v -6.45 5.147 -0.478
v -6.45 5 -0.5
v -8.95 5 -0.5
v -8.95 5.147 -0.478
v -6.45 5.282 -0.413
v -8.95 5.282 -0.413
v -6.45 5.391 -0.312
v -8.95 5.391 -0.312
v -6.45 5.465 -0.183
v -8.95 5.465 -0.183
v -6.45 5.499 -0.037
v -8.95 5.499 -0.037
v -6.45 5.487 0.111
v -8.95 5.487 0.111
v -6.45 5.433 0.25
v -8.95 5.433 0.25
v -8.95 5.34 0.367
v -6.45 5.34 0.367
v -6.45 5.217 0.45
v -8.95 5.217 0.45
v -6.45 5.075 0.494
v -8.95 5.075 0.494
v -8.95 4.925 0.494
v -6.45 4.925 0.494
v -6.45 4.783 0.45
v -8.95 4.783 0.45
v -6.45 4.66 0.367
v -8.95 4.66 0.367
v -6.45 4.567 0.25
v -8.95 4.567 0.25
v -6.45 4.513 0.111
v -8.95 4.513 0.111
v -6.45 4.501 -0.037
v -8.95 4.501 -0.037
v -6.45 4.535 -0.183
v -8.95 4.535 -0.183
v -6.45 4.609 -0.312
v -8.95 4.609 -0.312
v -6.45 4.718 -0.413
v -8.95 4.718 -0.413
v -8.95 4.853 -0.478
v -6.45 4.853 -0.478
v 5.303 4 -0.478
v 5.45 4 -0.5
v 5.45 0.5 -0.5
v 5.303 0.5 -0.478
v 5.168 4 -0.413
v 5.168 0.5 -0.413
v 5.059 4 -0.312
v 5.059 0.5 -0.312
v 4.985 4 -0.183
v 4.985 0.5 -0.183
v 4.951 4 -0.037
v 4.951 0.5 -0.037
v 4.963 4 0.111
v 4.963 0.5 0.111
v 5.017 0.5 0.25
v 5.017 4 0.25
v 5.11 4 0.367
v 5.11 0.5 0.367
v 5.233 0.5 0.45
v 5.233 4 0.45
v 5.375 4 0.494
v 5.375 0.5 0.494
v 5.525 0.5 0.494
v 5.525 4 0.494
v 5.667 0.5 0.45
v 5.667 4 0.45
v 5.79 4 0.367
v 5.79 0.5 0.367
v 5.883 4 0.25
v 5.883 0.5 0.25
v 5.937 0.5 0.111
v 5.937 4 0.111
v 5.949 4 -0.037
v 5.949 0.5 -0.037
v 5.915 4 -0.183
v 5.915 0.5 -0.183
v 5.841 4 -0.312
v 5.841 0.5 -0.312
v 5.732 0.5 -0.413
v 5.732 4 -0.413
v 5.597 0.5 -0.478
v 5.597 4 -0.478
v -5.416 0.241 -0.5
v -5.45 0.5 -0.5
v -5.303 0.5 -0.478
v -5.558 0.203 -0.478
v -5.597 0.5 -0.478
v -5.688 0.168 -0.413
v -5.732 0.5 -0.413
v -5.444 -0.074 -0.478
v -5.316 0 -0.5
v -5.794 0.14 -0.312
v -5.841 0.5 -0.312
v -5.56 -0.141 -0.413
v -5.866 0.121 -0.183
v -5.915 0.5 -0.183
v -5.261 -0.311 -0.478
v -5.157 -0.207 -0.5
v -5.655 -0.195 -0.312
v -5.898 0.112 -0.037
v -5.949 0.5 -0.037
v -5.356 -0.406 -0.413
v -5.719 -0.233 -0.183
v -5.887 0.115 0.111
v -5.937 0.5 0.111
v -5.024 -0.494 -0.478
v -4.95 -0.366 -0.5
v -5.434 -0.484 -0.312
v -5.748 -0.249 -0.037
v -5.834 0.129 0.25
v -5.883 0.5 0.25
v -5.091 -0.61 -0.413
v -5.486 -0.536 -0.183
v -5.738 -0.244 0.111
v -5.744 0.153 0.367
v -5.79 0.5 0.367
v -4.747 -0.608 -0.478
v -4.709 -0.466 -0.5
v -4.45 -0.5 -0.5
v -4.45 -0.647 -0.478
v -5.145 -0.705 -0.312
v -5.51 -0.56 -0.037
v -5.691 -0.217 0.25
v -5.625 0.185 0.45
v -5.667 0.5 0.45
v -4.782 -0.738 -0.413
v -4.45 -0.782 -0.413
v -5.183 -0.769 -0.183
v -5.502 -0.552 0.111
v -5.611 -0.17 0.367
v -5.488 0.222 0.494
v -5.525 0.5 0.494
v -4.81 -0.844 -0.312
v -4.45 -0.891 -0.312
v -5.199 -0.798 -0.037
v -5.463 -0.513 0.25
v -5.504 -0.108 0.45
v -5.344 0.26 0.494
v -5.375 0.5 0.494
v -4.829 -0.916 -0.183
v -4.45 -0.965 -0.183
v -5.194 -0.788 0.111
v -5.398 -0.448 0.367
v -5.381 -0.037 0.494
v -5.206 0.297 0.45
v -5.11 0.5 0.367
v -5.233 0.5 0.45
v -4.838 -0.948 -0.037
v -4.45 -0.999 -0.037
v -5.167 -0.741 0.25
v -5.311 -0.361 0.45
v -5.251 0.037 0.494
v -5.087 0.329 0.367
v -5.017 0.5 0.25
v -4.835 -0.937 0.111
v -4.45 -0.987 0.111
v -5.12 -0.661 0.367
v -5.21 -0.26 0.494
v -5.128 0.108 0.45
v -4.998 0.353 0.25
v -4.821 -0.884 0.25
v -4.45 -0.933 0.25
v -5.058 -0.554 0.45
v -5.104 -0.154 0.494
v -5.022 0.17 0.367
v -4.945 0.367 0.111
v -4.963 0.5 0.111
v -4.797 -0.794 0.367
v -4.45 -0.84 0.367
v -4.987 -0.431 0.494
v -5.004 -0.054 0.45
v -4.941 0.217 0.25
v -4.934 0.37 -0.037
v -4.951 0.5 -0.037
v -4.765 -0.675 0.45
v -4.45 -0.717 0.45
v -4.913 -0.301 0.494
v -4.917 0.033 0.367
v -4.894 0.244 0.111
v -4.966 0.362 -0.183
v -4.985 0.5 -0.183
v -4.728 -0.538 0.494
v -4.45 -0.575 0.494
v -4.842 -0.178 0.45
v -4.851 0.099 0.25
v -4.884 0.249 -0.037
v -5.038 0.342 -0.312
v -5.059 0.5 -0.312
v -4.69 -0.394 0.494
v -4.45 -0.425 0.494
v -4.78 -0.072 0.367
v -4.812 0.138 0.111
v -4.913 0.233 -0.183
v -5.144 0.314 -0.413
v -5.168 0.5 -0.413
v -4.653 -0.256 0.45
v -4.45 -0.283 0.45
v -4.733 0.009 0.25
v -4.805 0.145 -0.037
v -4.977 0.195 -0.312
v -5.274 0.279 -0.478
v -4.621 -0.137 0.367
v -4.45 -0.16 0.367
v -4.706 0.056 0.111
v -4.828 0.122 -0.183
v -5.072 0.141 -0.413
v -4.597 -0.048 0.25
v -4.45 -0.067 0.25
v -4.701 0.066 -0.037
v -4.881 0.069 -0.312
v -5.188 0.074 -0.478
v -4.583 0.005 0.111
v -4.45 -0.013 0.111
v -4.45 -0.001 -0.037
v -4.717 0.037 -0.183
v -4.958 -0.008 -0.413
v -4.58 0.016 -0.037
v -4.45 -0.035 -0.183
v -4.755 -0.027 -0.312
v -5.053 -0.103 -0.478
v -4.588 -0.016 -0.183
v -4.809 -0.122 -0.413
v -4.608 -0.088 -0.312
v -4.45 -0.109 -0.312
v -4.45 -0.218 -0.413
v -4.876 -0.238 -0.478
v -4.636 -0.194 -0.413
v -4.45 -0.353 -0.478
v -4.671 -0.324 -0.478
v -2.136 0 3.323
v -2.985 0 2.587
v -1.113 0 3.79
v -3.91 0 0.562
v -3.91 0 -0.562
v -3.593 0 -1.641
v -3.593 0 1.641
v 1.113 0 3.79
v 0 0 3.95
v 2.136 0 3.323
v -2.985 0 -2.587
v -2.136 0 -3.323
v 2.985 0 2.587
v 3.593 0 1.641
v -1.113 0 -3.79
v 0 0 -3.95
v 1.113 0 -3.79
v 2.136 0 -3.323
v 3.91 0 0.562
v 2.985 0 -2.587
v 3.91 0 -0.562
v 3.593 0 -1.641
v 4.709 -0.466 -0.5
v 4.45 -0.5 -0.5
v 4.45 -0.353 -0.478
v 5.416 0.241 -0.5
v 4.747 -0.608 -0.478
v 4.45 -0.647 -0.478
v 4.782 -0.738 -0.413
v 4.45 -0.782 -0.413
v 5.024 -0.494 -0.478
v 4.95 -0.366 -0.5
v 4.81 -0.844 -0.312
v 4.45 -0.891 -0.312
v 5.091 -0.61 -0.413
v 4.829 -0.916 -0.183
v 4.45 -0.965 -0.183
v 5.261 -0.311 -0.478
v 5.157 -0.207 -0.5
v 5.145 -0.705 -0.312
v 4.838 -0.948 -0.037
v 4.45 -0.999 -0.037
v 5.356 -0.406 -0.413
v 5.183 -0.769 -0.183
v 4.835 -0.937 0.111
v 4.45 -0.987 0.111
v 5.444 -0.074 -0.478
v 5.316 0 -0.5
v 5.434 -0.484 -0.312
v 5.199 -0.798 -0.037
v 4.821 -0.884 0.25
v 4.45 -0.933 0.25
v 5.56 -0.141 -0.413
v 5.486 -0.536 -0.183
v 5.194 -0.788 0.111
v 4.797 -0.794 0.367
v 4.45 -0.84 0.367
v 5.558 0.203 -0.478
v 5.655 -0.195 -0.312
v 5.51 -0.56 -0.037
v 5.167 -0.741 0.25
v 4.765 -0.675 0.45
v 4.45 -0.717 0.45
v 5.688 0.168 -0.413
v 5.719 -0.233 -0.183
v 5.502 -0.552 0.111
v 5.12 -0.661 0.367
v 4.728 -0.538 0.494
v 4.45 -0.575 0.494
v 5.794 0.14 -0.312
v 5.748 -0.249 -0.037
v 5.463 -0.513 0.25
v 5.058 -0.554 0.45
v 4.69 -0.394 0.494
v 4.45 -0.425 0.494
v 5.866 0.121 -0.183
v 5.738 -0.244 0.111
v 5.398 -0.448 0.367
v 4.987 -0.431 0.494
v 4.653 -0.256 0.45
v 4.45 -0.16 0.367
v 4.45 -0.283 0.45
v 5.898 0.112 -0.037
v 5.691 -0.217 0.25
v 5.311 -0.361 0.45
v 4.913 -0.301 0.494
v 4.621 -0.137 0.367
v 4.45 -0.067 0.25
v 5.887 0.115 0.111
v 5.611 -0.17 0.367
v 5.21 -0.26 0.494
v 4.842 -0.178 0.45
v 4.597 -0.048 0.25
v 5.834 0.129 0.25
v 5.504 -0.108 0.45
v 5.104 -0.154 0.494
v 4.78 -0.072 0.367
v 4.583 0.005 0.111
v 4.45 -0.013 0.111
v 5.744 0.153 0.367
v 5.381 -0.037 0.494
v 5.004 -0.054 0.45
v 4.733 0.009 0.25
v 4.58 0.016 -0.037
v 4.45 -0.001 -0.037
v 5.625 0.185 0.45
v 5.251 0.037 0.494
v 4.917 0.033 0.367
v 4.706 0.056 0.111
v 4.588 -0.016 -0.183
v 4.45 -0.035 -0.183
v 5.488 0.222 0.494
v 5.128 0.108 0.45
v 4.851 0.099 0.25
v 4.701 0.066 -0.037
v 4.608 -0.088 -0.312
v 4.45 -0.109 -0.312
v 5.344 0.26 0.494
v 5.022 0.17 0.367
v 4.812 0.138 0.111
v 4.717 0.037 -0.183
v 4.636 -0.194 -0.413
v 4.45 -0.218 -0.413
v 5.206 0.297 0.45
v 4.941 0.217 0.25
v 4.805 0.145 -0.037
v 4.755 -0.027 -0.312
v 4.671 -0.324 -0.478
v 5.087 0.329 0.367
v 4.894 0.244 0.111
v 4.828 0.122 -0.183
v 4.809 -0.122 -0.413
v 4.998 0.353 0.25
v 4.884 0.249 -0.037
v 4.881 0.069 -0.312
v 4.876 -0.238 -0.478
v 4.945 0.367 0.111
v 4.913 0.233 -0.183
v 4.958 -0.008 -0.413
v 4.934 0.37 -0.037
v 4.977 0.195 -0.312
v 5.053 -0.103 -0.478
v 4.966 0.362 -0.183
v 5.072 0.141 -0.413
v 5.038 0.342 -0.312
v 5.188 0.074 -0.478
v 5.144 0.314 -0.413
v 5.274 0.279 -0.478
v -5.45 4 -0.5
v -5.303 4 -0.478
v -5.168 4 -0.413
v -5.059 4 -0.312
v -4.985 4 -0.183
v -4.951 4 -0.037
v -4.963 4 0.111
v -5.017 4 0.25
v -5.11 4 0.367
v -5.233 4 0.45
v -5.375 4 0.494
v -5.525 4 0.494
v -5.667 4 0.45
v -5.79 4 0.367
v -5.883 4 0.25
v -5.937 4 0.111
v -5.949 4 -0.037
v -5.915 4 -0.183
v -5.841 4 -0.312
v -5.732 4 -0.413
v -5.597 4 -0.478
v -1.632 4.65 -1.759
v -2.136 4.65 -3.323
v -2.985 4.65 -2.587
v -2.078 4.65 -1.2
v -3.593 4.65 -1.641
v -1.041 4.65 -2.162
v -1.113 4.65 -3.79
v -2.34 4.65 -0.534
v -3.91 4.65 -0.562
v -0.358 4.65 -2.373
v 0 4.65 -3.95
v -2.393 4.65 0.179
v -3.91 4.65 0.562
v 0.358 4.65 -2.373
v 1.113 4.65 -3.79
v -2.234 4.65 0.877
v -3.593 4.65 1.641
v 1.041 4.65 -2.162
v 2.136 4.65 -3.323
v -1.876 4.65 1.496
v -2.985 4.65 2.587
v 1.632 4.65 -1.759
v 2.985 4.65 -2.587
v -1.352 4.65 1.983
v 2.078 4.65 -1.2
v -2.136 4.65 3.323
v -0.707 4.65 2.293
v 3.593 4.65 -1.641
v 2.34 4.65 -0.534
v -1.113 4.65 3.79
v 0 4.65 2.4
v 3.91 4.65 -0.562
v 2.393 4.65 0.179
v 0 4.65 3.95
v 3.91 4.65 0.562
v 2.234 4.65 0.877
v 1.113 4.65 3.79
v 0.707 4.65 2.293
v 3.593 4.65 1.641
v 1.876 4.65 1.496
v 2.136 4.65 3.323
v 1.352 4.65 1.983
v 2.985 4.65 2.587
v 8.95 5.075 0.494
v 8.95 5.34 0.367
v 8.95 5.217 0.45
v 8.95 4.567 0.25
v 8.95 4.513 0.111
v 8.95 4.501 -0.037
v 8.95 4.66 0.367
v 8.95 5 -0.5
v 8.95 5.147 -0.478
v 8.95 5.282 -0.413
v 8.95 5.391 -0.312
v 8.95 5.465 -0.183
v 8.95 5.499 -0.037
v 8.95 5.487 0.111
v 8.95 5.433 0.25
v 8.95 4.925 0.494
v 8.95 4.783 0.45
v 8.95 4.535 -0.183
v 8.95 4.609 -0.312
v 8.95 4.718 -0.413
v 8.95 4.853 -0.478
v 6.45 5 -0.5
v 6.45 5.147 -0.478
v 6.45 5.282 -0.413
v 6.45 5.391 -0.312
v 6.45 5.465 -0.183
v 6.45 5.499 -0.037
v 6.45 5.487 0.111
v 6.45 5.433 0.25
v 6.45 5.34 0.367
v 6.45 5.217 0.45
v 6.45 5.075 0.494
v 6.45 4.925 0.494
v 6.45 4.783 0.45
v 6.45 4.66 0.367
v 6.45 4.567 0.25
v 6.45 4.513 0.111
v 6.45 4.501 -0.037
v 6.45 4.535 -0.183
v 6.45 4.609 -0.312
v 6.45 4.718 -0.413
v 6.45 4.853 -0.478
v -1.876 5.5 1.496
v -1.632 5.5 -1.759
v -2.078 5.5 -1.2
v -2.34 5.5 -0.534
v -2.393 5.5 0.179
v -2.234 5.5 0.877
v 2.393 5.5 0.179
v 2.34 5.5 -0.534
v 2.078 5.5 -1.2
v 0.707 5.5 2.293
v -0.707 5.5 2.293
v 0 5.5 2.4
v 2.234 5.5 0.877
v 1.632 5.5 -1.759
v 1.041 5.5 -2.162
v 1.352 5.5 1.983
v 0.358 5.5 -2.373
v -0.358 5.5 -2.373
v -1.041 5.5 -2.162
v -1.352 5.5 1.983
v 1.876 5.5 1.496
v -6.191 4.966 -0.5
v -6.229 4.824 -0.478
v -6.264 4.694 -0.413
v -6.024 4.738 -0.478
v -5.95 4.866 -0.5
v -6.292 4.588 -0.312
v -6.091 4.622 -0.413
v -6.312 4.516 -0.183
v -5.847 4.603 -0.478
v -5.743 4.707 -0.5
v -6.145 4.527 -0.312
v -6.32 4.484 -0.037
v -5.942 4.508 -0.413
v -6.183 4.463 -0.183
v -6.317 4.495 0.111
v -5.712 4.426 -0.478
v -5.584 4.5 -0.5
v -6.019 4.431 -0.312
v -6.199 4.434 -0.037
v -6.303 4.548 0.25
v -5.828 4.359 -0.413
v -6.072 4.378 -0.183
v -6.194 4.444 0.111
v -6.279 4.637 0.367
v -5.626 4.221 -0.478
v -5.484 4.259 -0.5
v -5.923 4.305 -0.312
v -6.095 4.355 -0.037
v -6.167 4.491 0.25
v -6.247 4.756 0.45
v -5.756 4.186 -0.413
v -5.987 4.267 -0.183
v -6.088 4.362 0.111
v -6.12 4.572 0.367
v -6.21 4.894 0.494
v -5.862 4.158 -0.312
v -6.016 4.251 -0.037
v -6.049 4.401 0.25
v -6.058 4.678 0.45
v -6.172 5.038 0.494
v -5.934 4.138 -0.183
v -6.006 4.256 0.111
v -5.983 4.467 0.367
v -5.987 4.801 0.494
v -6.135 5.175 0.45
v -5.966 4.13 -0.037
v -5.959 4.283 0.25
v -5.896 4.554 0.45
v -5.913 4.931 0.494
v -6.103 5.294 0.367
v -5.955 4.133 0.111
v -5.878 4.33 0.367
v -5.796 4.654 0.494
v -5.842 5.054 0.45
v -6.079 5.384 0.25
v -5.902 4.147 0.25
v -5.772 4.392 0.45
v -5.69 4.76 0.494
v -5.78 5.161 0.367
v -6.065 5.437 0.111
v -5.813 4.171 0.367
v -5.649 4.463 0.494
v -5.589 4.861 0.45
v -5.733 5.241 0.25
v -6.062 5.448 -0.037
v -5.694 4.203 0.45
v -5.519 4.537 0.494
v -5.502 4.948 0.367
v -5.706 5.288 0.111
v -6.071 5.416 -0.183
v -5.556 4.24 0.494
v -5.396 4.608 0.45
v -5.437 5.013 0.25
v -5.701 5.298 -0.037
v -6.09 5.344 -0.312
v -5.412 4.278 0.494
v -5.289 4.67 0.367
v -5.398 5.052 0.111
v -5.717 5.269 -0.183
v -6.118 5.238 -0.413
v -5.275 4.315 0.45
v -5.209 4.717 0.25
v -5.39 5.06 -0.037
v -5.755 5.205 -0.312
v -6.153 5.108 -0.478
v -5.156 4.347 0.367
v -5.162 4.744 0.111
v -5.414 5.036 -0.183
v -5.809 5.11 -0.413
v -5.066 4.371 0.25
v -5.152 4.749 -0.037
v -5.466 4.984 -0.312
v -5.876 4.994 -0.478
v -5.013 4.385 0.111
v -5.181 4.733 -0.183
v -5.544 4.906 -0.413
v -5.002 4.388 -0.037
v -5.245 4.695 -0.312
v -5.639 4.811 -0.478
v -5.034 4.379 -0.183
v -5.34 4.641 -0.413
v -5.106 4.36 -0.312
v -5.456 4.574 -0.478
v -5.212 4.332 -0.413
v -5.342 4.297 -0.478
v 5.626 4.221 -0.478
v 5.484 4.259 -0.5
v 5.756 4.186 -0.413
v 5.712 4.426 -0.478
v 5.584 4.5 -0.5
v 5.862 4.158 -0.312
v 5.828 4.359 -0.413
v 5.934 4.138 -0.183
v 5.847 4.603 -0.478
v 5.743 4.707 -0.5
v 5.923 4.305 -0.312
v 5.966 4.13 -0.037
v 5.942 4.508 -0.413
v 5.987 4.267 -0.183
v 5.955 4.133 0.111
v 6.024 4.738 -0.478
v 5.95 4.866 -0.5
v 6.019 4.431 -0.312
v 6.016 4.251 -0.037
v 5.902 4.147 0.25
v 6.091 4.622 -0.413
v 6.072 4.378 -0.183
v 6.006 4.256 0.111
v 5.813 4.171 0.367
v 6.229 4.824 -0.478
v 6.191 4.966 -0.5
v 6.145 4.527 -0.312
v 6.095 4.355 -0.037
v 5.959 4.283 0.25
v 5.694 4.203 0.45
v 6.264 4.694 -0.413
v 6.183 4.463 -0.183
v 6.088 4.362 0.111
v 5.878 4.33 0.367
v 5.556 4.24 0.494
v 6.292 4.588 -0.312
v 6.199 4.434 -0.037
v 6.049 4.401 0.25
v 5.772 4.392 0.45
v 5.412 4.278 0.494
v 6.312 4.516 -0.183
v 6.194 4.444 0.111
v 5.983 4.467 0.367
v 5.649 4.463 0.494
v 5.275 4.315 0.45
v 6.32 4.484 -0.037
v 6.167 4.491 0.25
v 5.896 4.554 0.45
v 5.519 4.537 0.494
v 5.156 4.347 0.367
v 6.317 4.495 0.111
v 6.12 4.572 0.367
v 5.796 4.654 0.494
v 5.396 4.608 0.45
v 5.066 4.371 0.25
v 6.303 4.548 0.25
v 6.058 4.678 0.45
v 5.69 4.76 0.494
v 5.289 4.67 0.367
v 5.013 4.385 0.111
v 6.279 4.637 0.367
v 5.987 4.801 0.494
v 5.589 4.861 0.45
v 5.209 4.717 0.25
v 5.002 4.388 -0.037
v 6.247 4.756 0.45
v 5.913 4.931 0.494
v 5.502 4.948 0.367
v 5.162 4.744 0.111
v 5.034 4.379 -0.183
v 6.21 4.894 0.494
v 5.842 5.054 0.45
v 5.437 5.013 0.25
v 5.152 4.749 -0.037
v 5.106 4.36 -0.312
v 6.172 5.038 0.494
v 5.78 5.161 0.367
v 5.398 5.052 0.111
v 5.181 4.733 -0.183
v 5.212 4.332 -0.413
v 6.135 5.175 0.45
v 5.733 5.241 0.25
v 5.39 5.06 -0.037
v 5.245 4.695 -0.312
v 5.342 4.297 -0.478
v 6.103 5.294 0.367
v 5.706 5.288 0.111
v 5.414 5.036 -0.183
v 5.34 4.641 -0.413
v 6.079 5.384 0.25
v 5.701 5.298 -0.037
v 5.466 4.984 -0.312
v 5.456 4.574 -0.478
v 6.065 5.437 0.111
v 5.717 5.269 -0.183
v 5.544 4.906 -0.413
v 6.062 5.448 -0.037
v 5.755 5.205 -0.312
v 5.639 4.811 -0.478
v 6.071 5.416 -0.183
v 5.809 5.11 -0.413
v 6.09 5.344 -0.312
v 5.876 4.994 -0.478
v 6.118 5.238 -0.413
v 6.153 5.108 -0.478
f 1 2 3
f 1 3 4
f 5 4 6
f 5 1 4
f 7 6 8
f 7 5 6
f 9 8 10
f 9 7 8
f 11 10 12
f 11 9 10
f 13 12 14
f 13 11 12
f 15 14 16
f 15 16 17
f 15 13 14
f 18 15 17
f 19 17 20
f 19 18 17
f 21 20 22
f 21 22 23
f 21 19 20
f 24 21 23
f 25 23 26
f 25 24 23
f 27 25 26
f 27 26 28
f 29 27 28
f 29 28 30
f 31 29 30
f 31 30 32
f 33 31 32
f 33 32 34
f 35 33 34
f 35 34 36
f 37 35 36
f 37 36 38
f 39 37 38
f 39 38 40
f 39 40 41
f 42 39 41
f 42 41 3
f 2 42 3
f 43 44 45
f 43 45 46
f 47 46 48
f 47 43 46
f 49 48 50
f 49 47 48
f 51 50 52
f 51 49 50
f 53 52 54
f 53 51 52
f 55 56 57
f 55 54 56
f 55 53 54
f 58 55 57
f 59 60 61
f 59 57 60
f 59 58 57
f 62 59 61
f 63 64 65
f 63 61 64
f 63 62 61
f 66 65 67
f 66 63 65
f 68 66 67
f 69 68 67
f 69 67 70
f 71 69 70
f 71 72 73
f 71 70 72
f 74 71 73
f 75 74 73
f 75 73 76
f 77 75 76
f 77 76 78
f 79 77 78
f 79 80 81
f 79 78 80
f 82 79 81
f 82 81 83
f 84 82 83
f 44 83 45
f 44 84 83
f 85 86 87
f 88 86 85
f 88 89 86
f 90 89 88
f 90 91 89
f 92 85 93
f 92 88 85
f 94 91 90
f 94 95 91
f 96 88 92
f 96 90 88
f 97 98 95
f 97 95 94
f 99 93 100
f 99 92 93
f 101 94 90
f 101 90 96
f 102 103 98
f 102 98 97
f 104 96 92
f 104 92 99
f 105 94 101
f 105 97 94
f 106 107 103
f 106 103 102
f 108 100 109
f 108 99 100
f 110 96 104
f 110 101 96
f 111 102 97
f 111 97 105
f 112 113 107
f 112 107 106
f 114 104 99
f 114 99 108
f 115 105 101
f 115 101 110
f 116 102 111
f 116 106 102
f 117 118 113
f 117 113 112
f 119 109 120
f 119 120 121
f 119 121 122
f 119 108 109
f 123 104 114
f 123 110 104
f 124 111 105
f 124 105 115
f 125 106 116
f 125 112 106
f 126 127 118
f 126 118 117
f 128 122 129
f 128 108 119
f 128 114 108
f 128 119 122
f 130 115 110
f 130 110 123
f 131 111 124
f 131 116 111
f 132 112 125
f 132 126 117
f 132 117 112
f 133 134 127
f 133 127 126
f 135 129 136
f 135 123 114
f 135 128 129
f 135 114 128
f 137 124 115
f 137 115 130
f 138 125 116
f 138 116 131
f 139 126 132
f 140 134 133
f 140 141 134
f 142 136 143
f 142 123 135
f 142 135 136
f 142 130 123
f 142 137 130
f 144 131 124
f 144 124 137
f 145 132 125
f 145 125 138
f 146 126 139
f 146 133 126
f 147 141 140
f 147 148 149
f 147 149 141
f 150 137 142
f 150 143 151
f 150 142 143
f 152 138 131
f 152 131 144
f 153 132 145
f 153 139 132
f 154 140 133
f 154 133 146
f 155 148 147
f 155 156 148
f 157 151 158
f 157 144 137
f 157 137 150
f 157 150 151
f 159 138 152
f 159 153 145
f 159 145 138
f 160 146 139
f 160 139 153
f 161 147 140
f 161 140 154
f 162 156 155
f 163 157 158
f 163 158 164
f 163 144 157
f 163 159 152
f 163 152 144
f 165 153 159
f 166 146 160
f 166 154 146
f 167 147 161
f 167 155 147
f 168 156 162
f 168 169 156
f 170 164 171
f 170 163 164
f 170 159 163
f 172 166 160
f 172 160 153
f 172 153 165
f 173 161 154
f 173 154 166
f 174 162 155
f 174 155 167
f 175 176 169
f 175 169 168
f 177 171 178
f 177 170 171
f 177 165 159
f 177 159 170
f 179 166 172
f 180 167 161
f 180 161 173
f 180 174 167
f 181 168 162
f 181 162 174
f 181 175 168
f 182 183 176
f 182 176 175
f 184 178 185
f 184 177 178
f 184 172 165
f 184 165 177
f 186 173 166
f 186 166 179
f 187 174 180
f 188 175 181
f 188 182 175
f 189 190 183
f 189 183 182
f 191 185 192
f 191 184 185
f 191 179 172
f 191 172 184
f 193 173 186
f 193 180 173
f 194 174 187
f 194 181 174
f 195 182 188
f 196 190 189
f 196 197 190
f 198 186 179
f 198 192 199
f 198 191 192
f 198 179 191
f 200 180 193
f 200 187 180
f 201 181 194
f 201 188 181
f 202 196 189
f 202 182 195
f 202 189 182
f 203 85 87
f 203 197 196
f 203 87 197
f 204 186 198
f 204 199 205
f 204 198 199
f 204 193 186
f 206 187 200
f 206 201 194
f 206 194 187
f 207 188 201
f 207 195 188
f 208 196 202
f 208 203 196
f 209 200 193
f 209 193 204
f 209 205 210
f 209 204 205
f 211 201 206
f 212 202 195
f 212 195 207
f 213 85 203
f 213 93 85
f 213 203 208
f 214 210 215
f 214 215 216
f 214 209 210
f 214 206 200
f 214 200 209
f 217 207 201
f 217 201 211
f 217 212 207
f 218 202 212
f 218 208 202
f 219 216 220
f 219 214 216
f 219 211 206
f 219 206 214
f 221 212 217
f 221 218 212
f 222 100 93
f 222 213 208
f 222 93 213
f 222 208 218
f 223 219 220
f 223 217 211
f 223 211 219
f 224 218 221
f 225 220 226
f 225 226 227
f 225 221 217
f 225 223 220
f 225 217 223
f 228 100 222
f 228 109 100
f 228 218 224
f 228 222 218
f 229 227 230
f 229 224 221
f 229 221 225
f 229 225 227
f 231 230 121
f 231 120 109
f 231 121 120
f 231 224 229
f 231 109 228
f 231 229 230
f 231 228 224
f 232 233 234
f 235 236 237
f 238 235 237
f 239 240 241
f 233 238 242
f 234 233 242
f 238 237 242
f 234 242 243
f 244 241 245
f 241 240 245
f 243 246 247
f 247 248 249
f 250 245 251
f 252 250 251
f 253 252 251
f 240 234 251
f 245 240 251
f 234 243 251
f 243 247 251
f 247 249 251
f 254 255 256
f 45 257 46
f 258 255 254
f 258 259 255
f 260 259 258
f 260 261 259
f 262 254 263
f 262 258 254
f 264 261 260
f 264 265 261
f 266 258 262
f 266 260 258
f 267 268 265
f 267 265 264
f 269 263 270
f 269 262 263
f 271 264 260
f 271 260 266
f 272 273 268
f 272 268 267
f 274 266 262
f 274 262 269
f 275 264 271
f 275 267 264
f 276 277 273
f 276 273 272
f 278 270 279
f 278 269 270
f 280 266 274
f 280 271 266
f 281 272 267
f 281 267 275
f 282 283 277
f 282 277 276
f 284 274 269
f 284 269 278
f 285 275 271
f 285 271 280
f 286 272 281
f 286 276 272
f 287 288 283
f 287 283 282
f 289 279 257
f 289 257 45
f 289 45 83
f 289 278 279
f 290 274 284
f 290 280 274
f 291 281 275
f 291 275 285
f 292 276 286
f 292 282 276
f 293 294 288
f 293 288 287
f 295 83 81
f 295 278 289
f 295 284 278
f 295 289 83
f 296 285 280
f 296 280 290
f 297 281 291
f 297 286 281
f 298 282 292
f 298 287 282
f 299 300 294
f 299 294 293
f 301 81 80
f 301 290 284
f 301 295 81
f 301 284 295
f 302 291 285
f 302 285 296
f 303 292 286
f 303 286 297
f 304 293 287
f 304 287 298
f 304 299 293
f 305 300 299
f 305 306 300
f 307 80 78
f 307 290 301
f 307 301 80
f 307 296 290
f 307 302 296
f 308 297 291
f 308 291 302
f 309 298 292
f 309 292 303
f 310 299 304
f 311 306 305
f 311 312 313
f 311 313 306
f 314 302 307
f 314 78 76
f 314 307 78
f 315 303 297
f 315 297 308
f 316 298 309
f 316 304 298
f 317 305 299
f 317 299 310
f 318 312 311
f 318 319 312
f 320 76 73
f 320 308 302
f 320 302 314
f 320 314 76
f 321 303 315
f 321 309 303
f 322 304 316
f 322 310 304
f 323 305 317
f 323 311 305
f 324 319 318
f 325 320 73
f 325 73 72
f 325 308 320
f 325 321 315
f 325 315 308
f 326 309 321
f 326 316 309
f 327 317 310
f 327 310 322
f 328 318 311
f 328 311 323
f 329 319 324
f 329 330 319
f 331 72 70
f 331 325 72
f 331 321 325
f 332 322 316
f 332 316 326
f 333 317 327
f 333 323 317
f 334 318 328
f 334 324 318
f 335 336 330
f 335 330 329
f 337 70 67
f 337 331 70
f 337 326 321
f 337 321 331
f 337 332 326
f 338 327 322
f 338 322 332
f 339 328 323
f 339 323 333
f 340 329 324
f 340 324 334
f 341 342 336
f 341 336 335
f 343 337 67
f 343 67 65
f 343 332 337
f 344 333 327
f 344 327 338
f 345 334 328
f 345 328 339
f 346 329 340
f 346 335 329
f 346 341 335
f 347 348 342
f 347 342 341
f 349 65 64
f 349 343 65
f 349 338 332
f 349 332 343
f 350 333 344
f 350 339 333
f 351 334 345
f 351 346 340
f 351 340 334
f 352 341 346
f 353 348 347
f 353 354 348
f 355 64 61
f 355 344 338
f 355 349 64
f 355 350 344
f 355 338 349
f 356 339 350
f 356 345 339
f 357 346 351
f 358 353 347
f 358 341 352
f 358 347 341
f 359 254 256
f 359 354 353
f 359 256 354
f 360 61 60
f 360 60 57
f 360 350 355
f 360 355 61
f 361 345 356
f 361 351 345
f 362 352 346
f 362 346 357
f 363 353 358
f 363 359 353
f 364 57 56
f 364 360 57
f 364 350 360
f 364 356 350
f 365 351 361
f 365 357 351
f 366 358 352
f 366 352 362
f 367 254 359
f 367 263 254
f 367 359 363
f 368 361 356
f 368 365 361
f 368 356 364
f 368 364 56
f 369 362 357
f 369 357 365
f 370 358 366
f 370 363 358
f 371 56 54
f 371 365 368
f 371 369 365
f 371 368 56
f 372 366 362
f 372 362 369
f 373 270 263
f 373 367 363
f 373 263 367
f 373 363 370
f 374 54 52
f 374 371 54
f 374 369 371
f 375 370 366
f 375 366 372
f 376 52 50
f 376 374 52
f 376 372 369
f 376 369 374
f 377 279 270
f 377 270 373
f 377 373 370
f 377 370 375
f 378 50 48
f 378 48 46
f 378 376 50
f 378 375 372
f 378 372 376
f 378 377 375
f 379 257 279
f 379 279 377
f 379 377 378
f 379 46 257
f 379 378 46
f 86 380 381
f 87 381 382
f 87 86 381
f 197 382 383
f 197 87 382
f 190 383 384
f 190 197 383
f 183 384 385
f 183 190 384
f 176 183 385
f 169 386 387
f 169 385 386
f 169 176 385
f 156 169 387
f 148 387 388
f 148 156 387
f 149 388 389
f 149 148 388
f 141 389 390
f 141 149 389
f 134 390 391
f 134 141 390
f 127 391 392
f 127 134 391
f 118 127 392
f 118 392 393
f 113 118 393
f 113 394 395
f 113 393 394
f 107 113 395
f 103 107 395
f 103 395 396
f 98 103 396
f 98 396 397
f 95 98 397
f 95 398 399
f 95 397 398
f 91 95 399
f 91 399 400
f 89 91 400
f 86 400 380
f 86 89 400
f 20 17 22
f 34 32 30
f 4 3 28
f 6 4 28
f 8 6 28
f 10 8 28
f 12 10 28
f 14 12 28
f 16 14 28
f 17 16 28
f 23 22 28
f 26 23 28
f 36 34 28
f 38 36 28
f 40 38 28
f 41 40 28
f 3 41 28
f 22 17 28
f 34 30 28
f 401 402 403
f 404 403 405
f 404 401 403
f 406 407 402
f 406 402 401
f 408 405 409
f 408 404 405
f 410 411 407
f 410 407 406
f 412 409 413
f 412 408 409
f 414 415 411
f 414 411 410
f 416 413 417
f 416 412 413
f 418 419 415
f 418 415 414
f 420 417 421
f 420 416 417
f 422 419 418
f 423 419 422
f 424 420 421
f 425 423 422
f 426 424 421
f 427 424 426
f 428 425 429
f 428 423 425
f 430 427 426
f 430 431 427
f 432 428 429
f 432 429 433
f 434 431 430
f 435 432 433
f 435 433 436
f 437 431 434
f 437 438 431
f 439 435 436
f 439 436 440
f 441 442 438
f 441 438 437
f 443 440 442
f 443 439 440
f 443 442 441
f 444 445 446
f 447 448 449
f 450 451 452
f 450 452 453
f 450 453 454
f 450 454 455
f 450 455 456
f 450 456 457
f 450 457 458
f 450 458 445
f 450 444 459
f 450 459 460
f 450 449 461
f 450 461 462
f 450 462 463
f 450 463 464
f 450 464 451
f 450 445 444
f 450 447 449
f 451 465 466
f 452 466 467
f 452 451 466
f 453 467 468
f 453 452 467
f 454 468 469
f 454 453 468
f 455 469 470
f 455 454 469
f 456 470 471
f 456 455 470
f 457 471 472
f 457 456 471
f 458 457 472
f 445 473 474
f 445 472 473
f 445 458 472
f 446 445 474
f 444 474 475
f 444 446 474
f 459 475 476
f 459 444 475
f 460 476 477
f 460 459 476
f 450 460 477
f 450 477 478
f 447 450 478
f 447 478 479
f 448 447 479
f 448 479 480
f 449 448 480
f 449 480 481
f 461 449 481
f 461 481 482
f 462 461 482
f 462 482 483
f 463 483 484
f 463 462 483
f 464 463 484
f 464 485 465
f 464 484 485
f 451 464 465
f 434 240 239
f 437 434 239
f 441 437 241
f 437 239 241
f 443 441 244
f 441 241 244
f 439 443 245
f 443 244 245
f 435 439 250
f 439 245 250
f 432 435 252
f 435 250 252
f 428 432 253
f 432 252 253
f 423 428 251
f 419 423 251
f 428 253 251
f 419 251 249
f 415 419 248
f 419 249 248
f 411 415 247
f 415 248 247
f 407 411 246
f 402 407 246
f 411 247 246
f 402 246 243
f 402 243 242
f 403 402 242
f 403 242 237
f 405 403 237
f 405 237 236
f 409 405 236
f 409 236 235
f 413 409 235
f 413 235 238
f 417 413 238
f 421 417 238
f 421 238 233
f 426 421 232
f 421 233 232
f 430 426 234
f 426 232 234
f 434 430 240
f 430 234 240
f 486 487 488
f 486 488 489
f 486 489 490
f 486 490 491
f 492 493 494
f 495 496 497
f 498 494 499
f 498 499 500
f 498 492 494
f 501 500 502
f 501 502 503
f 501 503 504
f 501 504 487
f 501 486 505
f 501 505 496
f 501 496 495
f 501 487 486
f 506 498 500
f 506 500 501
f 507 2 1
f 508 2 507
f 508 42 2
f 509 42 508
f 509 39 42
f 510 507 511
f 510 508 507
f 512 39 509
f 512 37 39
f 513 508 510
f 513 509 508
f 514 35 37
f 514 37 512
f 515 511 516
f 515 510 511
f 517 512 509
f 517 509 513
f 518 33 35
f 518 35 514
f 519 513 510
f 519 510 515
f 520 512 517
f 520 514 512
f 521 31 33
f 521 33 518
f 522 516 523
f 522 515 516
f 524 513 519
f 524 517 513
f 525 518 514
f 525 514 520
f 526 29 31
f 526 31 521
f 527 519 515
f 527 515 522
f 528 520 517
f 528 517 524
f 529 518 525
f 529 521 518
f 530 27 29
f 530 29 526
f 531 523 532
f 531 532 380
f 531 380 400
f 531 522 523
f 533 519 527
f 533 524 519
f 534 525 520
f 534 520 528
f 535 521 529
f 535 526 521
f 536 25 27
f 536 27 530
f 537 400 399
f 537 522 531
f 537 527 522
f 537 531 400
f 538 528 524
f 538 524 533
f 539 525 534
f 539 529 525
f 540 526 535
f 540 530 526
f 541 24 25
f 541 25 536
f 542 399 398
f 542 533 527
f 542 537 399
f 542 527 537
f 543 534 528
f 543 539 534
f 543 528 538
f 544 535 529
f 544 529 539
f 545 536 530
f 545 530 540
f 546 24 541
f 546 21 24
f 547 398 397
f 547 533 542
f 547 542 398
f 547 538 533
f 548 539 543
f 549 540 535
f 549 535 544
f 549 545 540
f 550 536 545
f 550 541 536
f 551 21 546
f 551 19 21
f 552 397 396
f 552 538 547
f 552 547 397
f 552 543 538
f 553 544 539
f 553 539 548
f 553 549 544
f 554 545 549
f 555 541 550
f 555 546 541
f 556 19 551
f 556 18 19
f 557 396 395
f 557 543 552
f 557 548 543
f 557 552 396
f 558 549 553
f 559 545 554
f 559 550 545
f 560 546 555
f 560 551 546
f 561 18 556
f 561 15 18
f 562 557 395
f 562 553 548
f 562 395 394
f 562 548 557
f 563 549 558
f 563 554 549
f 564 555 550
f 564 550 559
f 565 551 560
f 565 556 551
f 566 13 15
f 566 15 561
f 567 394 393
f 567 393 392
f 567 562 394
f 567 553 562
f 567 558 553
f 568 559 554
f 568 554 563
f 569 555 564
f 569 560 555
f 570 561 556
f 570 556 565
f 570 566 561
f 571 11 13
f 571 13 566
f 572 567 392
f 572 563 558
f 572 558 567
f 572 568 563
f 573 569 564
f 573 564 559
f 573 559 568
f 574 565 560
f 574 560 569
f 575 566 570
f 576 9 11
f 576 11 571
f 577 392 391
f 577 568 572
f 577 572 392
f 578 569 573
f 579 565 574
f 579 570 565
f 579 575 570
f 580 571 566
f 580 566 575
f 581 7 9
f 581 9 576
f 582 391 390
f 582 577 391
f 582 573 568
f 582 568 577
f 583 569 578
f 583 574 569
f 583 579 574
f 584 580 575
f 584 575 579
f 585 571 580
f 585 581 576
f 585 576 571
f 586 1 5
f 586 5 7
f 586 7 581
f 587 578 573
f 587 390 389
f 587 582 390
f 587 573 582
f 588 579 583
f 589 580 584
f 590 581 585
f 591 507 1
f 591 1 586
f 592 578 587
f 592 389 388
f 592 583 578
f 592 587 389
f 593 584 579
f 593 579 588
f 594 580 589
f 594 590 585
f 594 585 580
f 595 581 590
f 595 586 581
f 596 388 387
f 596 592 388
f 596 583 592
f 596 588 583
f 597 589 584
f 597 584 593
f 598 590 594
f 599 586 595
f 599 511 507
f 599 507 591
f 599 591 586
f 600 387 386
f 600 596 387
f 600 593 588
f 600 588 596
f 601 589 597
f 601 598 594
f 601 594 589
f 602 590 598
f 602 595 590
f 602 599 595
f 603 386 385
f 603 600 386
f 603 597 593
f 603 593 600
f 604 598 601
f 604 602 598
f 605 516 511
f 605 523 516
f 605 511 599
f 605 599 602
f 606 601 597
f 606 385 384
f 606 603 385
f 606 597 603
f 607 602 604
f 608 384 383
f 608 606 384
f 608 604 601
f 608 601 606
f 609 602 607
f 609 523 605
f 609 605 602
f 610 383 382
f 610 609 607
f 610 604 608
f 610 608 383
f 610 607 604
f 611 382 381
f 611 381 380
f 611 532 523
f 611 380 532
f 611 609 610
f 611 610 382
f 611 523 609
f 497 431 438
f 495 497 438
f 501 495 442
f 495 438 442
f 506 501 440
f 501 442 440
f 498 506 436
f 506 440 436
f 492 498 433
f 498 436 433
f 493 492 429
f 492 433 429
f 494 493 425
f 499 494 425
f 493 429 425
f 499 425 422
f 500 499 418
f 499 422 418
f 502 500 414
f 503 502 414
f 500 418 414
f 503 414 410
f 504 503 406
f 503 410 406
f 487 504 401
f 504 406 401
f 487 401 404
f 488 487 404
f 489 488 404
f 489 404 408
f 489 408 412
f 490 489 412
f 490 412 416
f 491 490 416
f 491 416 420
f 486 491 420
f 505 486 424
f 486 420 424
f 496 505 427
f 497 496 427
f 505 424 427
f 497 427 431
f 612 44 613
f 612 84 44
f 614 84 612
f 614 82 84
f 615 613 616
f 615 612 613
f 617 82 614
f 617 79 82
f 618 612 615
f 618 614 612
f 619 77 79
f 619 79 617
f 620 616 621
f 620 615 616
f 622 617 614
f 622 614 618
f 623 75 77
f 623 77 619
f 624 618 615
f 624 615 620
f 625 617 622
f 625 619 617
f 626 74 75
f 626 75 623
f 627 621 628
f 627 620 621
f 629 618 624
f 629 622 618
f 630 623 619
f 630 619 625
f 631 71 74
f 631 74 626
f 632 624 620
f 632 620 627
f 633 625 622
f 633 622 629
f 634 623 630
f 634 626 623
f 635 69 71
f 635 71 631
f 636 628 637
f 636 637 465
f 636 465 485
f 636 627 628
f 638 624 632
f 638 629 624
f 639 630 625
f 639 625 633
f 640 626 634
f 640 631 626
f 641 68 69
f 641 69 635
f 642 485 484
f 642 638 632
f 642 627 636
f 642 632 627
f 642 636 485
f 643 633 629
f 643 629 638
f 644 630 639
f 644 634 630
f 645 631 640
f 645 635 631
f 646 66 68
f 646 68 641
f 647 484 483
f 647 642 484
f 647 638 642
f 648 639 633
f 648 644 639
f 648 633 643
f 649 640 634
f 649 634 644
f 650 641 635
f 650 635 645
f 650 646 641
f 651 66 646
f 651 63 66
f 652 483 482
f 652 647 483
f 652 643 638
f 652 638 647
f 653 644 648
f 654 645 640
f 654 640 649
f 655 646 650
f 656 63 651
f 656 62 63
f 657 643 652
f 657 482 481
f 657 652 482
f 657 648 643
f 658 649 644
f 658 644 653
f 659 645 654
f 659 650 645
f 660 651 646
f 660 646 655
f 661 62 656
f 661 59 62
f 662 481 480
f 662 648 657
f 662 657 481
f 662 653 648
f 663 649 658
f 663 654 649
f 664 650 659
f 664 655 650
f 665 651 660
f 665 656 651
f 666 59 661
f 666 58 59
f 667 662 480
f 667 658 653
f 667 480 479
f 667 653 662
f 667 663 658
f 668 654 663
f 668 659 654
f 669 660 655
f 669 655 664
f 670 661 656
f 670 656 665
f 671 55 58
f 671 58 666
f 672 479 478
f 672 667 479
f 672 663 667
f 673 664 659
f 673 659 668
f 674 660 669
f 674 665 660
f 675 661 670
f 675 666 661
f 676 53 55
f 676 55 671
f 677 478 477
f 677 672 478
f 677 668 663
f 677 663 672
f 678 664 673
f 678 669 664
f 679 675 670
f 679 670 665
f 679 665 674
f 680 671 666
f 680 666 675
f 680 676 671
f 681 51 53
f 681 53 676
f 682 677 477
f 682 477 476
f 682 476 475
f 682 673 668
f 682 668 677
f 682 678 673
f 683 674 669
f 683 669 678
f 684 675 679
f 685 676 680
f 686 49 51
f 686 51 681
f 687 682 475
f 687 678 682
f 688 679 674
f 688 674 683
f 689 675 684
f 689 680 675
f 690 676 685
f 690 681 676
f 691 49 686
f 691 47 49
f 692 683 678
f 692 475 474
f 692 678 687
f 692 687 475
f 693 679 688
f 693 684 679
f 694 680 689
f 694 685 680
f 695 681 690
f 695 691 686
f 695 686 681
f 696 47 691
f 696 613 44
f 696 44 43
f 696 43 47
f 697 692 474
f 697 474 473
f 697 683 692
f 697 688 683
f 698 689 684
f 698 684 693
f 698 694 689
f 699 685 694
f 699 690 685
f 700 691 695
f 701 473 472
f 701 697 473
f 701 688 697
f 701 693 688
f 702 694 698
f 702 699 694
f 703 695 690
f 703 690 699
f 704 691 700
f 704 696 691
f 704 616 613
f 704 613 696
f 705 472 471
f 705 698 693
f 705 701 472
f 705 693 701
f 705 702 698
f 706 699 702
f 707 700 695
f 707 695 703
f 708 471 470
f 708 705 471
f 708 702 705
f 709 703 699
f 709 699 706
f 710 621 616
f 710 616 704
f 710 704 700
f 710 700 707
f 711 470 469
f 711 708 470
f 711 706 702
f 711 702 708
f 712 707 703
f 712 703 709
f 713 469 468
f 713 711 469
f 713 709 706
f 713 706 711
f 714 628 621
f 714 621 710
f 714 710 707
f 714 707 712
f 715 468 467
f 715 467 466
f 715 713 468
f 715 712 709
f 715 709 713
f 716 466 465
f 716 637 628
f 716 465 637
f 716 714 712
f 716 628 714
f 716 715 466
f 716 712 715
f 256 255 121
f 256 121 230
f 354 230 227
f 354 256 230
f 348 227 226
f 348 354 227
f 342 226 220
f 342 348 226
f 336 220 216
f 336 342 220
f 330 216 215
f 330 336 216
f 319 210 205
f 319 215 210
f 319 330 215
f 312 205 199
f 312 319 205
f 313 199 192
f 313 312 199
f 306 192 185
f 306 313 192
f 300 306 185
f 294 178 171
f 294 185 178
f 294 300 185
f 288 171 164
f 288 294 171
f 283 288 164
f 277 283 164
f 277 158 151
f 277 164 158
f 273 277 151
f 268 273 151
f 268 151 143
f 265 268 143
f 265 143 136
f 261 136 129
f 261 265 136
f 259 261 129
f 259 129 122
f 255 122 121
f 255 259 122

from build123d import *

# Parameters (mm, degrees)
SKETCH_1_R      = 3.95
SKETCH_1_R_2    = 2.4
EXTRUDE_1_DEPTH = 4.65
EXTRUDE_START   = 4.65
SKETCH_1_3_R    = 2.4
EXTRUDE_2_DEPTH = 0.85
SKETCH_3_R      = 0.5


with BuildPart() as part:
    # Эскиз1 → Бобышка-Вытянуть1 (new body)
    # profile 1 of 2: a face of its own
    with BuildSketch(Plane(origin=(0, 0, 0), x_dir=(1, 0, 0), z_dir=(0, 1, 0))):
        with Locations(Location((0, 0, 0), (0, 0, 270))):
            Circle(SKETCH_1_R)
        Circle(SKETCH_1_R_2, mode=Mode.SUBTRACT)
    # profile 2 of 2: a face of its own
    with BuildSketch(Plane(origin=(0, 0, 0), x_dir=(1, 0, 0), z_dir=(0, 1, 0))):
        Circle(SKETCH_1_R_2)
    extrude(amount=EXTRUDE_1_DEPTH)

    # Эскиз1<3> → Бобышка-Вытянуть2 (add)
    with BuildSketch(Plane(origin=(0, 0, 0), x_dir=(1, 0, 0), z_dir=(0, 1, 0)).offset(EXTRUDE_START)):
        with Locations(Location((0, 0, 0), (0, 0, 270))):
            Circle(SKETCH_1_3_R)
    extrude(amount=EXTRUDE_2_DEPTH)


with BuildPart() as body_2:
    # По траектории3: sweep along a path in Эскиз2
    with BuildLine(Plane.XY) as sweep_3_path:
        Line((-8.95, 5), (-6.45, 5))
        ThreePointArc((-6.45, 5), (-5.742893219, 4.707106781), (-5.45, 4))
        Line((-5.45, 4), (-5.45, 0.5))
        ThreePointArc((-5.45, 0.5), (-5.157106781, -0.207106781), (-4.45, -0.5))
        Line((-4.45, -0.5), (4.45, -0.5))
        ThreePointArc((4.45, -0.5), (5.157106781, -0.207106781), (5.45, 0.5))
        Line((5.45, 0.5), (5.45, 4))
        ThreePointArc((5.45, 4), (5.742893219, 4.707106781), (6.45, 5))
        Line((6.45, 5), (8.95, 5))
    # Эскиз3 → По траектории3 (sweep)
    with BuildSketch(Plane(origin=(-8.95, 0, 0), x_dir=(0, 0, -1), z_dir=(1, 0, 0))):
        with Locations((0, 5)):
            Circle(SKETCH_3_R)
    sweep(path=sweep_3_path.line)


solid = Compound([part.part, body_2.part])
